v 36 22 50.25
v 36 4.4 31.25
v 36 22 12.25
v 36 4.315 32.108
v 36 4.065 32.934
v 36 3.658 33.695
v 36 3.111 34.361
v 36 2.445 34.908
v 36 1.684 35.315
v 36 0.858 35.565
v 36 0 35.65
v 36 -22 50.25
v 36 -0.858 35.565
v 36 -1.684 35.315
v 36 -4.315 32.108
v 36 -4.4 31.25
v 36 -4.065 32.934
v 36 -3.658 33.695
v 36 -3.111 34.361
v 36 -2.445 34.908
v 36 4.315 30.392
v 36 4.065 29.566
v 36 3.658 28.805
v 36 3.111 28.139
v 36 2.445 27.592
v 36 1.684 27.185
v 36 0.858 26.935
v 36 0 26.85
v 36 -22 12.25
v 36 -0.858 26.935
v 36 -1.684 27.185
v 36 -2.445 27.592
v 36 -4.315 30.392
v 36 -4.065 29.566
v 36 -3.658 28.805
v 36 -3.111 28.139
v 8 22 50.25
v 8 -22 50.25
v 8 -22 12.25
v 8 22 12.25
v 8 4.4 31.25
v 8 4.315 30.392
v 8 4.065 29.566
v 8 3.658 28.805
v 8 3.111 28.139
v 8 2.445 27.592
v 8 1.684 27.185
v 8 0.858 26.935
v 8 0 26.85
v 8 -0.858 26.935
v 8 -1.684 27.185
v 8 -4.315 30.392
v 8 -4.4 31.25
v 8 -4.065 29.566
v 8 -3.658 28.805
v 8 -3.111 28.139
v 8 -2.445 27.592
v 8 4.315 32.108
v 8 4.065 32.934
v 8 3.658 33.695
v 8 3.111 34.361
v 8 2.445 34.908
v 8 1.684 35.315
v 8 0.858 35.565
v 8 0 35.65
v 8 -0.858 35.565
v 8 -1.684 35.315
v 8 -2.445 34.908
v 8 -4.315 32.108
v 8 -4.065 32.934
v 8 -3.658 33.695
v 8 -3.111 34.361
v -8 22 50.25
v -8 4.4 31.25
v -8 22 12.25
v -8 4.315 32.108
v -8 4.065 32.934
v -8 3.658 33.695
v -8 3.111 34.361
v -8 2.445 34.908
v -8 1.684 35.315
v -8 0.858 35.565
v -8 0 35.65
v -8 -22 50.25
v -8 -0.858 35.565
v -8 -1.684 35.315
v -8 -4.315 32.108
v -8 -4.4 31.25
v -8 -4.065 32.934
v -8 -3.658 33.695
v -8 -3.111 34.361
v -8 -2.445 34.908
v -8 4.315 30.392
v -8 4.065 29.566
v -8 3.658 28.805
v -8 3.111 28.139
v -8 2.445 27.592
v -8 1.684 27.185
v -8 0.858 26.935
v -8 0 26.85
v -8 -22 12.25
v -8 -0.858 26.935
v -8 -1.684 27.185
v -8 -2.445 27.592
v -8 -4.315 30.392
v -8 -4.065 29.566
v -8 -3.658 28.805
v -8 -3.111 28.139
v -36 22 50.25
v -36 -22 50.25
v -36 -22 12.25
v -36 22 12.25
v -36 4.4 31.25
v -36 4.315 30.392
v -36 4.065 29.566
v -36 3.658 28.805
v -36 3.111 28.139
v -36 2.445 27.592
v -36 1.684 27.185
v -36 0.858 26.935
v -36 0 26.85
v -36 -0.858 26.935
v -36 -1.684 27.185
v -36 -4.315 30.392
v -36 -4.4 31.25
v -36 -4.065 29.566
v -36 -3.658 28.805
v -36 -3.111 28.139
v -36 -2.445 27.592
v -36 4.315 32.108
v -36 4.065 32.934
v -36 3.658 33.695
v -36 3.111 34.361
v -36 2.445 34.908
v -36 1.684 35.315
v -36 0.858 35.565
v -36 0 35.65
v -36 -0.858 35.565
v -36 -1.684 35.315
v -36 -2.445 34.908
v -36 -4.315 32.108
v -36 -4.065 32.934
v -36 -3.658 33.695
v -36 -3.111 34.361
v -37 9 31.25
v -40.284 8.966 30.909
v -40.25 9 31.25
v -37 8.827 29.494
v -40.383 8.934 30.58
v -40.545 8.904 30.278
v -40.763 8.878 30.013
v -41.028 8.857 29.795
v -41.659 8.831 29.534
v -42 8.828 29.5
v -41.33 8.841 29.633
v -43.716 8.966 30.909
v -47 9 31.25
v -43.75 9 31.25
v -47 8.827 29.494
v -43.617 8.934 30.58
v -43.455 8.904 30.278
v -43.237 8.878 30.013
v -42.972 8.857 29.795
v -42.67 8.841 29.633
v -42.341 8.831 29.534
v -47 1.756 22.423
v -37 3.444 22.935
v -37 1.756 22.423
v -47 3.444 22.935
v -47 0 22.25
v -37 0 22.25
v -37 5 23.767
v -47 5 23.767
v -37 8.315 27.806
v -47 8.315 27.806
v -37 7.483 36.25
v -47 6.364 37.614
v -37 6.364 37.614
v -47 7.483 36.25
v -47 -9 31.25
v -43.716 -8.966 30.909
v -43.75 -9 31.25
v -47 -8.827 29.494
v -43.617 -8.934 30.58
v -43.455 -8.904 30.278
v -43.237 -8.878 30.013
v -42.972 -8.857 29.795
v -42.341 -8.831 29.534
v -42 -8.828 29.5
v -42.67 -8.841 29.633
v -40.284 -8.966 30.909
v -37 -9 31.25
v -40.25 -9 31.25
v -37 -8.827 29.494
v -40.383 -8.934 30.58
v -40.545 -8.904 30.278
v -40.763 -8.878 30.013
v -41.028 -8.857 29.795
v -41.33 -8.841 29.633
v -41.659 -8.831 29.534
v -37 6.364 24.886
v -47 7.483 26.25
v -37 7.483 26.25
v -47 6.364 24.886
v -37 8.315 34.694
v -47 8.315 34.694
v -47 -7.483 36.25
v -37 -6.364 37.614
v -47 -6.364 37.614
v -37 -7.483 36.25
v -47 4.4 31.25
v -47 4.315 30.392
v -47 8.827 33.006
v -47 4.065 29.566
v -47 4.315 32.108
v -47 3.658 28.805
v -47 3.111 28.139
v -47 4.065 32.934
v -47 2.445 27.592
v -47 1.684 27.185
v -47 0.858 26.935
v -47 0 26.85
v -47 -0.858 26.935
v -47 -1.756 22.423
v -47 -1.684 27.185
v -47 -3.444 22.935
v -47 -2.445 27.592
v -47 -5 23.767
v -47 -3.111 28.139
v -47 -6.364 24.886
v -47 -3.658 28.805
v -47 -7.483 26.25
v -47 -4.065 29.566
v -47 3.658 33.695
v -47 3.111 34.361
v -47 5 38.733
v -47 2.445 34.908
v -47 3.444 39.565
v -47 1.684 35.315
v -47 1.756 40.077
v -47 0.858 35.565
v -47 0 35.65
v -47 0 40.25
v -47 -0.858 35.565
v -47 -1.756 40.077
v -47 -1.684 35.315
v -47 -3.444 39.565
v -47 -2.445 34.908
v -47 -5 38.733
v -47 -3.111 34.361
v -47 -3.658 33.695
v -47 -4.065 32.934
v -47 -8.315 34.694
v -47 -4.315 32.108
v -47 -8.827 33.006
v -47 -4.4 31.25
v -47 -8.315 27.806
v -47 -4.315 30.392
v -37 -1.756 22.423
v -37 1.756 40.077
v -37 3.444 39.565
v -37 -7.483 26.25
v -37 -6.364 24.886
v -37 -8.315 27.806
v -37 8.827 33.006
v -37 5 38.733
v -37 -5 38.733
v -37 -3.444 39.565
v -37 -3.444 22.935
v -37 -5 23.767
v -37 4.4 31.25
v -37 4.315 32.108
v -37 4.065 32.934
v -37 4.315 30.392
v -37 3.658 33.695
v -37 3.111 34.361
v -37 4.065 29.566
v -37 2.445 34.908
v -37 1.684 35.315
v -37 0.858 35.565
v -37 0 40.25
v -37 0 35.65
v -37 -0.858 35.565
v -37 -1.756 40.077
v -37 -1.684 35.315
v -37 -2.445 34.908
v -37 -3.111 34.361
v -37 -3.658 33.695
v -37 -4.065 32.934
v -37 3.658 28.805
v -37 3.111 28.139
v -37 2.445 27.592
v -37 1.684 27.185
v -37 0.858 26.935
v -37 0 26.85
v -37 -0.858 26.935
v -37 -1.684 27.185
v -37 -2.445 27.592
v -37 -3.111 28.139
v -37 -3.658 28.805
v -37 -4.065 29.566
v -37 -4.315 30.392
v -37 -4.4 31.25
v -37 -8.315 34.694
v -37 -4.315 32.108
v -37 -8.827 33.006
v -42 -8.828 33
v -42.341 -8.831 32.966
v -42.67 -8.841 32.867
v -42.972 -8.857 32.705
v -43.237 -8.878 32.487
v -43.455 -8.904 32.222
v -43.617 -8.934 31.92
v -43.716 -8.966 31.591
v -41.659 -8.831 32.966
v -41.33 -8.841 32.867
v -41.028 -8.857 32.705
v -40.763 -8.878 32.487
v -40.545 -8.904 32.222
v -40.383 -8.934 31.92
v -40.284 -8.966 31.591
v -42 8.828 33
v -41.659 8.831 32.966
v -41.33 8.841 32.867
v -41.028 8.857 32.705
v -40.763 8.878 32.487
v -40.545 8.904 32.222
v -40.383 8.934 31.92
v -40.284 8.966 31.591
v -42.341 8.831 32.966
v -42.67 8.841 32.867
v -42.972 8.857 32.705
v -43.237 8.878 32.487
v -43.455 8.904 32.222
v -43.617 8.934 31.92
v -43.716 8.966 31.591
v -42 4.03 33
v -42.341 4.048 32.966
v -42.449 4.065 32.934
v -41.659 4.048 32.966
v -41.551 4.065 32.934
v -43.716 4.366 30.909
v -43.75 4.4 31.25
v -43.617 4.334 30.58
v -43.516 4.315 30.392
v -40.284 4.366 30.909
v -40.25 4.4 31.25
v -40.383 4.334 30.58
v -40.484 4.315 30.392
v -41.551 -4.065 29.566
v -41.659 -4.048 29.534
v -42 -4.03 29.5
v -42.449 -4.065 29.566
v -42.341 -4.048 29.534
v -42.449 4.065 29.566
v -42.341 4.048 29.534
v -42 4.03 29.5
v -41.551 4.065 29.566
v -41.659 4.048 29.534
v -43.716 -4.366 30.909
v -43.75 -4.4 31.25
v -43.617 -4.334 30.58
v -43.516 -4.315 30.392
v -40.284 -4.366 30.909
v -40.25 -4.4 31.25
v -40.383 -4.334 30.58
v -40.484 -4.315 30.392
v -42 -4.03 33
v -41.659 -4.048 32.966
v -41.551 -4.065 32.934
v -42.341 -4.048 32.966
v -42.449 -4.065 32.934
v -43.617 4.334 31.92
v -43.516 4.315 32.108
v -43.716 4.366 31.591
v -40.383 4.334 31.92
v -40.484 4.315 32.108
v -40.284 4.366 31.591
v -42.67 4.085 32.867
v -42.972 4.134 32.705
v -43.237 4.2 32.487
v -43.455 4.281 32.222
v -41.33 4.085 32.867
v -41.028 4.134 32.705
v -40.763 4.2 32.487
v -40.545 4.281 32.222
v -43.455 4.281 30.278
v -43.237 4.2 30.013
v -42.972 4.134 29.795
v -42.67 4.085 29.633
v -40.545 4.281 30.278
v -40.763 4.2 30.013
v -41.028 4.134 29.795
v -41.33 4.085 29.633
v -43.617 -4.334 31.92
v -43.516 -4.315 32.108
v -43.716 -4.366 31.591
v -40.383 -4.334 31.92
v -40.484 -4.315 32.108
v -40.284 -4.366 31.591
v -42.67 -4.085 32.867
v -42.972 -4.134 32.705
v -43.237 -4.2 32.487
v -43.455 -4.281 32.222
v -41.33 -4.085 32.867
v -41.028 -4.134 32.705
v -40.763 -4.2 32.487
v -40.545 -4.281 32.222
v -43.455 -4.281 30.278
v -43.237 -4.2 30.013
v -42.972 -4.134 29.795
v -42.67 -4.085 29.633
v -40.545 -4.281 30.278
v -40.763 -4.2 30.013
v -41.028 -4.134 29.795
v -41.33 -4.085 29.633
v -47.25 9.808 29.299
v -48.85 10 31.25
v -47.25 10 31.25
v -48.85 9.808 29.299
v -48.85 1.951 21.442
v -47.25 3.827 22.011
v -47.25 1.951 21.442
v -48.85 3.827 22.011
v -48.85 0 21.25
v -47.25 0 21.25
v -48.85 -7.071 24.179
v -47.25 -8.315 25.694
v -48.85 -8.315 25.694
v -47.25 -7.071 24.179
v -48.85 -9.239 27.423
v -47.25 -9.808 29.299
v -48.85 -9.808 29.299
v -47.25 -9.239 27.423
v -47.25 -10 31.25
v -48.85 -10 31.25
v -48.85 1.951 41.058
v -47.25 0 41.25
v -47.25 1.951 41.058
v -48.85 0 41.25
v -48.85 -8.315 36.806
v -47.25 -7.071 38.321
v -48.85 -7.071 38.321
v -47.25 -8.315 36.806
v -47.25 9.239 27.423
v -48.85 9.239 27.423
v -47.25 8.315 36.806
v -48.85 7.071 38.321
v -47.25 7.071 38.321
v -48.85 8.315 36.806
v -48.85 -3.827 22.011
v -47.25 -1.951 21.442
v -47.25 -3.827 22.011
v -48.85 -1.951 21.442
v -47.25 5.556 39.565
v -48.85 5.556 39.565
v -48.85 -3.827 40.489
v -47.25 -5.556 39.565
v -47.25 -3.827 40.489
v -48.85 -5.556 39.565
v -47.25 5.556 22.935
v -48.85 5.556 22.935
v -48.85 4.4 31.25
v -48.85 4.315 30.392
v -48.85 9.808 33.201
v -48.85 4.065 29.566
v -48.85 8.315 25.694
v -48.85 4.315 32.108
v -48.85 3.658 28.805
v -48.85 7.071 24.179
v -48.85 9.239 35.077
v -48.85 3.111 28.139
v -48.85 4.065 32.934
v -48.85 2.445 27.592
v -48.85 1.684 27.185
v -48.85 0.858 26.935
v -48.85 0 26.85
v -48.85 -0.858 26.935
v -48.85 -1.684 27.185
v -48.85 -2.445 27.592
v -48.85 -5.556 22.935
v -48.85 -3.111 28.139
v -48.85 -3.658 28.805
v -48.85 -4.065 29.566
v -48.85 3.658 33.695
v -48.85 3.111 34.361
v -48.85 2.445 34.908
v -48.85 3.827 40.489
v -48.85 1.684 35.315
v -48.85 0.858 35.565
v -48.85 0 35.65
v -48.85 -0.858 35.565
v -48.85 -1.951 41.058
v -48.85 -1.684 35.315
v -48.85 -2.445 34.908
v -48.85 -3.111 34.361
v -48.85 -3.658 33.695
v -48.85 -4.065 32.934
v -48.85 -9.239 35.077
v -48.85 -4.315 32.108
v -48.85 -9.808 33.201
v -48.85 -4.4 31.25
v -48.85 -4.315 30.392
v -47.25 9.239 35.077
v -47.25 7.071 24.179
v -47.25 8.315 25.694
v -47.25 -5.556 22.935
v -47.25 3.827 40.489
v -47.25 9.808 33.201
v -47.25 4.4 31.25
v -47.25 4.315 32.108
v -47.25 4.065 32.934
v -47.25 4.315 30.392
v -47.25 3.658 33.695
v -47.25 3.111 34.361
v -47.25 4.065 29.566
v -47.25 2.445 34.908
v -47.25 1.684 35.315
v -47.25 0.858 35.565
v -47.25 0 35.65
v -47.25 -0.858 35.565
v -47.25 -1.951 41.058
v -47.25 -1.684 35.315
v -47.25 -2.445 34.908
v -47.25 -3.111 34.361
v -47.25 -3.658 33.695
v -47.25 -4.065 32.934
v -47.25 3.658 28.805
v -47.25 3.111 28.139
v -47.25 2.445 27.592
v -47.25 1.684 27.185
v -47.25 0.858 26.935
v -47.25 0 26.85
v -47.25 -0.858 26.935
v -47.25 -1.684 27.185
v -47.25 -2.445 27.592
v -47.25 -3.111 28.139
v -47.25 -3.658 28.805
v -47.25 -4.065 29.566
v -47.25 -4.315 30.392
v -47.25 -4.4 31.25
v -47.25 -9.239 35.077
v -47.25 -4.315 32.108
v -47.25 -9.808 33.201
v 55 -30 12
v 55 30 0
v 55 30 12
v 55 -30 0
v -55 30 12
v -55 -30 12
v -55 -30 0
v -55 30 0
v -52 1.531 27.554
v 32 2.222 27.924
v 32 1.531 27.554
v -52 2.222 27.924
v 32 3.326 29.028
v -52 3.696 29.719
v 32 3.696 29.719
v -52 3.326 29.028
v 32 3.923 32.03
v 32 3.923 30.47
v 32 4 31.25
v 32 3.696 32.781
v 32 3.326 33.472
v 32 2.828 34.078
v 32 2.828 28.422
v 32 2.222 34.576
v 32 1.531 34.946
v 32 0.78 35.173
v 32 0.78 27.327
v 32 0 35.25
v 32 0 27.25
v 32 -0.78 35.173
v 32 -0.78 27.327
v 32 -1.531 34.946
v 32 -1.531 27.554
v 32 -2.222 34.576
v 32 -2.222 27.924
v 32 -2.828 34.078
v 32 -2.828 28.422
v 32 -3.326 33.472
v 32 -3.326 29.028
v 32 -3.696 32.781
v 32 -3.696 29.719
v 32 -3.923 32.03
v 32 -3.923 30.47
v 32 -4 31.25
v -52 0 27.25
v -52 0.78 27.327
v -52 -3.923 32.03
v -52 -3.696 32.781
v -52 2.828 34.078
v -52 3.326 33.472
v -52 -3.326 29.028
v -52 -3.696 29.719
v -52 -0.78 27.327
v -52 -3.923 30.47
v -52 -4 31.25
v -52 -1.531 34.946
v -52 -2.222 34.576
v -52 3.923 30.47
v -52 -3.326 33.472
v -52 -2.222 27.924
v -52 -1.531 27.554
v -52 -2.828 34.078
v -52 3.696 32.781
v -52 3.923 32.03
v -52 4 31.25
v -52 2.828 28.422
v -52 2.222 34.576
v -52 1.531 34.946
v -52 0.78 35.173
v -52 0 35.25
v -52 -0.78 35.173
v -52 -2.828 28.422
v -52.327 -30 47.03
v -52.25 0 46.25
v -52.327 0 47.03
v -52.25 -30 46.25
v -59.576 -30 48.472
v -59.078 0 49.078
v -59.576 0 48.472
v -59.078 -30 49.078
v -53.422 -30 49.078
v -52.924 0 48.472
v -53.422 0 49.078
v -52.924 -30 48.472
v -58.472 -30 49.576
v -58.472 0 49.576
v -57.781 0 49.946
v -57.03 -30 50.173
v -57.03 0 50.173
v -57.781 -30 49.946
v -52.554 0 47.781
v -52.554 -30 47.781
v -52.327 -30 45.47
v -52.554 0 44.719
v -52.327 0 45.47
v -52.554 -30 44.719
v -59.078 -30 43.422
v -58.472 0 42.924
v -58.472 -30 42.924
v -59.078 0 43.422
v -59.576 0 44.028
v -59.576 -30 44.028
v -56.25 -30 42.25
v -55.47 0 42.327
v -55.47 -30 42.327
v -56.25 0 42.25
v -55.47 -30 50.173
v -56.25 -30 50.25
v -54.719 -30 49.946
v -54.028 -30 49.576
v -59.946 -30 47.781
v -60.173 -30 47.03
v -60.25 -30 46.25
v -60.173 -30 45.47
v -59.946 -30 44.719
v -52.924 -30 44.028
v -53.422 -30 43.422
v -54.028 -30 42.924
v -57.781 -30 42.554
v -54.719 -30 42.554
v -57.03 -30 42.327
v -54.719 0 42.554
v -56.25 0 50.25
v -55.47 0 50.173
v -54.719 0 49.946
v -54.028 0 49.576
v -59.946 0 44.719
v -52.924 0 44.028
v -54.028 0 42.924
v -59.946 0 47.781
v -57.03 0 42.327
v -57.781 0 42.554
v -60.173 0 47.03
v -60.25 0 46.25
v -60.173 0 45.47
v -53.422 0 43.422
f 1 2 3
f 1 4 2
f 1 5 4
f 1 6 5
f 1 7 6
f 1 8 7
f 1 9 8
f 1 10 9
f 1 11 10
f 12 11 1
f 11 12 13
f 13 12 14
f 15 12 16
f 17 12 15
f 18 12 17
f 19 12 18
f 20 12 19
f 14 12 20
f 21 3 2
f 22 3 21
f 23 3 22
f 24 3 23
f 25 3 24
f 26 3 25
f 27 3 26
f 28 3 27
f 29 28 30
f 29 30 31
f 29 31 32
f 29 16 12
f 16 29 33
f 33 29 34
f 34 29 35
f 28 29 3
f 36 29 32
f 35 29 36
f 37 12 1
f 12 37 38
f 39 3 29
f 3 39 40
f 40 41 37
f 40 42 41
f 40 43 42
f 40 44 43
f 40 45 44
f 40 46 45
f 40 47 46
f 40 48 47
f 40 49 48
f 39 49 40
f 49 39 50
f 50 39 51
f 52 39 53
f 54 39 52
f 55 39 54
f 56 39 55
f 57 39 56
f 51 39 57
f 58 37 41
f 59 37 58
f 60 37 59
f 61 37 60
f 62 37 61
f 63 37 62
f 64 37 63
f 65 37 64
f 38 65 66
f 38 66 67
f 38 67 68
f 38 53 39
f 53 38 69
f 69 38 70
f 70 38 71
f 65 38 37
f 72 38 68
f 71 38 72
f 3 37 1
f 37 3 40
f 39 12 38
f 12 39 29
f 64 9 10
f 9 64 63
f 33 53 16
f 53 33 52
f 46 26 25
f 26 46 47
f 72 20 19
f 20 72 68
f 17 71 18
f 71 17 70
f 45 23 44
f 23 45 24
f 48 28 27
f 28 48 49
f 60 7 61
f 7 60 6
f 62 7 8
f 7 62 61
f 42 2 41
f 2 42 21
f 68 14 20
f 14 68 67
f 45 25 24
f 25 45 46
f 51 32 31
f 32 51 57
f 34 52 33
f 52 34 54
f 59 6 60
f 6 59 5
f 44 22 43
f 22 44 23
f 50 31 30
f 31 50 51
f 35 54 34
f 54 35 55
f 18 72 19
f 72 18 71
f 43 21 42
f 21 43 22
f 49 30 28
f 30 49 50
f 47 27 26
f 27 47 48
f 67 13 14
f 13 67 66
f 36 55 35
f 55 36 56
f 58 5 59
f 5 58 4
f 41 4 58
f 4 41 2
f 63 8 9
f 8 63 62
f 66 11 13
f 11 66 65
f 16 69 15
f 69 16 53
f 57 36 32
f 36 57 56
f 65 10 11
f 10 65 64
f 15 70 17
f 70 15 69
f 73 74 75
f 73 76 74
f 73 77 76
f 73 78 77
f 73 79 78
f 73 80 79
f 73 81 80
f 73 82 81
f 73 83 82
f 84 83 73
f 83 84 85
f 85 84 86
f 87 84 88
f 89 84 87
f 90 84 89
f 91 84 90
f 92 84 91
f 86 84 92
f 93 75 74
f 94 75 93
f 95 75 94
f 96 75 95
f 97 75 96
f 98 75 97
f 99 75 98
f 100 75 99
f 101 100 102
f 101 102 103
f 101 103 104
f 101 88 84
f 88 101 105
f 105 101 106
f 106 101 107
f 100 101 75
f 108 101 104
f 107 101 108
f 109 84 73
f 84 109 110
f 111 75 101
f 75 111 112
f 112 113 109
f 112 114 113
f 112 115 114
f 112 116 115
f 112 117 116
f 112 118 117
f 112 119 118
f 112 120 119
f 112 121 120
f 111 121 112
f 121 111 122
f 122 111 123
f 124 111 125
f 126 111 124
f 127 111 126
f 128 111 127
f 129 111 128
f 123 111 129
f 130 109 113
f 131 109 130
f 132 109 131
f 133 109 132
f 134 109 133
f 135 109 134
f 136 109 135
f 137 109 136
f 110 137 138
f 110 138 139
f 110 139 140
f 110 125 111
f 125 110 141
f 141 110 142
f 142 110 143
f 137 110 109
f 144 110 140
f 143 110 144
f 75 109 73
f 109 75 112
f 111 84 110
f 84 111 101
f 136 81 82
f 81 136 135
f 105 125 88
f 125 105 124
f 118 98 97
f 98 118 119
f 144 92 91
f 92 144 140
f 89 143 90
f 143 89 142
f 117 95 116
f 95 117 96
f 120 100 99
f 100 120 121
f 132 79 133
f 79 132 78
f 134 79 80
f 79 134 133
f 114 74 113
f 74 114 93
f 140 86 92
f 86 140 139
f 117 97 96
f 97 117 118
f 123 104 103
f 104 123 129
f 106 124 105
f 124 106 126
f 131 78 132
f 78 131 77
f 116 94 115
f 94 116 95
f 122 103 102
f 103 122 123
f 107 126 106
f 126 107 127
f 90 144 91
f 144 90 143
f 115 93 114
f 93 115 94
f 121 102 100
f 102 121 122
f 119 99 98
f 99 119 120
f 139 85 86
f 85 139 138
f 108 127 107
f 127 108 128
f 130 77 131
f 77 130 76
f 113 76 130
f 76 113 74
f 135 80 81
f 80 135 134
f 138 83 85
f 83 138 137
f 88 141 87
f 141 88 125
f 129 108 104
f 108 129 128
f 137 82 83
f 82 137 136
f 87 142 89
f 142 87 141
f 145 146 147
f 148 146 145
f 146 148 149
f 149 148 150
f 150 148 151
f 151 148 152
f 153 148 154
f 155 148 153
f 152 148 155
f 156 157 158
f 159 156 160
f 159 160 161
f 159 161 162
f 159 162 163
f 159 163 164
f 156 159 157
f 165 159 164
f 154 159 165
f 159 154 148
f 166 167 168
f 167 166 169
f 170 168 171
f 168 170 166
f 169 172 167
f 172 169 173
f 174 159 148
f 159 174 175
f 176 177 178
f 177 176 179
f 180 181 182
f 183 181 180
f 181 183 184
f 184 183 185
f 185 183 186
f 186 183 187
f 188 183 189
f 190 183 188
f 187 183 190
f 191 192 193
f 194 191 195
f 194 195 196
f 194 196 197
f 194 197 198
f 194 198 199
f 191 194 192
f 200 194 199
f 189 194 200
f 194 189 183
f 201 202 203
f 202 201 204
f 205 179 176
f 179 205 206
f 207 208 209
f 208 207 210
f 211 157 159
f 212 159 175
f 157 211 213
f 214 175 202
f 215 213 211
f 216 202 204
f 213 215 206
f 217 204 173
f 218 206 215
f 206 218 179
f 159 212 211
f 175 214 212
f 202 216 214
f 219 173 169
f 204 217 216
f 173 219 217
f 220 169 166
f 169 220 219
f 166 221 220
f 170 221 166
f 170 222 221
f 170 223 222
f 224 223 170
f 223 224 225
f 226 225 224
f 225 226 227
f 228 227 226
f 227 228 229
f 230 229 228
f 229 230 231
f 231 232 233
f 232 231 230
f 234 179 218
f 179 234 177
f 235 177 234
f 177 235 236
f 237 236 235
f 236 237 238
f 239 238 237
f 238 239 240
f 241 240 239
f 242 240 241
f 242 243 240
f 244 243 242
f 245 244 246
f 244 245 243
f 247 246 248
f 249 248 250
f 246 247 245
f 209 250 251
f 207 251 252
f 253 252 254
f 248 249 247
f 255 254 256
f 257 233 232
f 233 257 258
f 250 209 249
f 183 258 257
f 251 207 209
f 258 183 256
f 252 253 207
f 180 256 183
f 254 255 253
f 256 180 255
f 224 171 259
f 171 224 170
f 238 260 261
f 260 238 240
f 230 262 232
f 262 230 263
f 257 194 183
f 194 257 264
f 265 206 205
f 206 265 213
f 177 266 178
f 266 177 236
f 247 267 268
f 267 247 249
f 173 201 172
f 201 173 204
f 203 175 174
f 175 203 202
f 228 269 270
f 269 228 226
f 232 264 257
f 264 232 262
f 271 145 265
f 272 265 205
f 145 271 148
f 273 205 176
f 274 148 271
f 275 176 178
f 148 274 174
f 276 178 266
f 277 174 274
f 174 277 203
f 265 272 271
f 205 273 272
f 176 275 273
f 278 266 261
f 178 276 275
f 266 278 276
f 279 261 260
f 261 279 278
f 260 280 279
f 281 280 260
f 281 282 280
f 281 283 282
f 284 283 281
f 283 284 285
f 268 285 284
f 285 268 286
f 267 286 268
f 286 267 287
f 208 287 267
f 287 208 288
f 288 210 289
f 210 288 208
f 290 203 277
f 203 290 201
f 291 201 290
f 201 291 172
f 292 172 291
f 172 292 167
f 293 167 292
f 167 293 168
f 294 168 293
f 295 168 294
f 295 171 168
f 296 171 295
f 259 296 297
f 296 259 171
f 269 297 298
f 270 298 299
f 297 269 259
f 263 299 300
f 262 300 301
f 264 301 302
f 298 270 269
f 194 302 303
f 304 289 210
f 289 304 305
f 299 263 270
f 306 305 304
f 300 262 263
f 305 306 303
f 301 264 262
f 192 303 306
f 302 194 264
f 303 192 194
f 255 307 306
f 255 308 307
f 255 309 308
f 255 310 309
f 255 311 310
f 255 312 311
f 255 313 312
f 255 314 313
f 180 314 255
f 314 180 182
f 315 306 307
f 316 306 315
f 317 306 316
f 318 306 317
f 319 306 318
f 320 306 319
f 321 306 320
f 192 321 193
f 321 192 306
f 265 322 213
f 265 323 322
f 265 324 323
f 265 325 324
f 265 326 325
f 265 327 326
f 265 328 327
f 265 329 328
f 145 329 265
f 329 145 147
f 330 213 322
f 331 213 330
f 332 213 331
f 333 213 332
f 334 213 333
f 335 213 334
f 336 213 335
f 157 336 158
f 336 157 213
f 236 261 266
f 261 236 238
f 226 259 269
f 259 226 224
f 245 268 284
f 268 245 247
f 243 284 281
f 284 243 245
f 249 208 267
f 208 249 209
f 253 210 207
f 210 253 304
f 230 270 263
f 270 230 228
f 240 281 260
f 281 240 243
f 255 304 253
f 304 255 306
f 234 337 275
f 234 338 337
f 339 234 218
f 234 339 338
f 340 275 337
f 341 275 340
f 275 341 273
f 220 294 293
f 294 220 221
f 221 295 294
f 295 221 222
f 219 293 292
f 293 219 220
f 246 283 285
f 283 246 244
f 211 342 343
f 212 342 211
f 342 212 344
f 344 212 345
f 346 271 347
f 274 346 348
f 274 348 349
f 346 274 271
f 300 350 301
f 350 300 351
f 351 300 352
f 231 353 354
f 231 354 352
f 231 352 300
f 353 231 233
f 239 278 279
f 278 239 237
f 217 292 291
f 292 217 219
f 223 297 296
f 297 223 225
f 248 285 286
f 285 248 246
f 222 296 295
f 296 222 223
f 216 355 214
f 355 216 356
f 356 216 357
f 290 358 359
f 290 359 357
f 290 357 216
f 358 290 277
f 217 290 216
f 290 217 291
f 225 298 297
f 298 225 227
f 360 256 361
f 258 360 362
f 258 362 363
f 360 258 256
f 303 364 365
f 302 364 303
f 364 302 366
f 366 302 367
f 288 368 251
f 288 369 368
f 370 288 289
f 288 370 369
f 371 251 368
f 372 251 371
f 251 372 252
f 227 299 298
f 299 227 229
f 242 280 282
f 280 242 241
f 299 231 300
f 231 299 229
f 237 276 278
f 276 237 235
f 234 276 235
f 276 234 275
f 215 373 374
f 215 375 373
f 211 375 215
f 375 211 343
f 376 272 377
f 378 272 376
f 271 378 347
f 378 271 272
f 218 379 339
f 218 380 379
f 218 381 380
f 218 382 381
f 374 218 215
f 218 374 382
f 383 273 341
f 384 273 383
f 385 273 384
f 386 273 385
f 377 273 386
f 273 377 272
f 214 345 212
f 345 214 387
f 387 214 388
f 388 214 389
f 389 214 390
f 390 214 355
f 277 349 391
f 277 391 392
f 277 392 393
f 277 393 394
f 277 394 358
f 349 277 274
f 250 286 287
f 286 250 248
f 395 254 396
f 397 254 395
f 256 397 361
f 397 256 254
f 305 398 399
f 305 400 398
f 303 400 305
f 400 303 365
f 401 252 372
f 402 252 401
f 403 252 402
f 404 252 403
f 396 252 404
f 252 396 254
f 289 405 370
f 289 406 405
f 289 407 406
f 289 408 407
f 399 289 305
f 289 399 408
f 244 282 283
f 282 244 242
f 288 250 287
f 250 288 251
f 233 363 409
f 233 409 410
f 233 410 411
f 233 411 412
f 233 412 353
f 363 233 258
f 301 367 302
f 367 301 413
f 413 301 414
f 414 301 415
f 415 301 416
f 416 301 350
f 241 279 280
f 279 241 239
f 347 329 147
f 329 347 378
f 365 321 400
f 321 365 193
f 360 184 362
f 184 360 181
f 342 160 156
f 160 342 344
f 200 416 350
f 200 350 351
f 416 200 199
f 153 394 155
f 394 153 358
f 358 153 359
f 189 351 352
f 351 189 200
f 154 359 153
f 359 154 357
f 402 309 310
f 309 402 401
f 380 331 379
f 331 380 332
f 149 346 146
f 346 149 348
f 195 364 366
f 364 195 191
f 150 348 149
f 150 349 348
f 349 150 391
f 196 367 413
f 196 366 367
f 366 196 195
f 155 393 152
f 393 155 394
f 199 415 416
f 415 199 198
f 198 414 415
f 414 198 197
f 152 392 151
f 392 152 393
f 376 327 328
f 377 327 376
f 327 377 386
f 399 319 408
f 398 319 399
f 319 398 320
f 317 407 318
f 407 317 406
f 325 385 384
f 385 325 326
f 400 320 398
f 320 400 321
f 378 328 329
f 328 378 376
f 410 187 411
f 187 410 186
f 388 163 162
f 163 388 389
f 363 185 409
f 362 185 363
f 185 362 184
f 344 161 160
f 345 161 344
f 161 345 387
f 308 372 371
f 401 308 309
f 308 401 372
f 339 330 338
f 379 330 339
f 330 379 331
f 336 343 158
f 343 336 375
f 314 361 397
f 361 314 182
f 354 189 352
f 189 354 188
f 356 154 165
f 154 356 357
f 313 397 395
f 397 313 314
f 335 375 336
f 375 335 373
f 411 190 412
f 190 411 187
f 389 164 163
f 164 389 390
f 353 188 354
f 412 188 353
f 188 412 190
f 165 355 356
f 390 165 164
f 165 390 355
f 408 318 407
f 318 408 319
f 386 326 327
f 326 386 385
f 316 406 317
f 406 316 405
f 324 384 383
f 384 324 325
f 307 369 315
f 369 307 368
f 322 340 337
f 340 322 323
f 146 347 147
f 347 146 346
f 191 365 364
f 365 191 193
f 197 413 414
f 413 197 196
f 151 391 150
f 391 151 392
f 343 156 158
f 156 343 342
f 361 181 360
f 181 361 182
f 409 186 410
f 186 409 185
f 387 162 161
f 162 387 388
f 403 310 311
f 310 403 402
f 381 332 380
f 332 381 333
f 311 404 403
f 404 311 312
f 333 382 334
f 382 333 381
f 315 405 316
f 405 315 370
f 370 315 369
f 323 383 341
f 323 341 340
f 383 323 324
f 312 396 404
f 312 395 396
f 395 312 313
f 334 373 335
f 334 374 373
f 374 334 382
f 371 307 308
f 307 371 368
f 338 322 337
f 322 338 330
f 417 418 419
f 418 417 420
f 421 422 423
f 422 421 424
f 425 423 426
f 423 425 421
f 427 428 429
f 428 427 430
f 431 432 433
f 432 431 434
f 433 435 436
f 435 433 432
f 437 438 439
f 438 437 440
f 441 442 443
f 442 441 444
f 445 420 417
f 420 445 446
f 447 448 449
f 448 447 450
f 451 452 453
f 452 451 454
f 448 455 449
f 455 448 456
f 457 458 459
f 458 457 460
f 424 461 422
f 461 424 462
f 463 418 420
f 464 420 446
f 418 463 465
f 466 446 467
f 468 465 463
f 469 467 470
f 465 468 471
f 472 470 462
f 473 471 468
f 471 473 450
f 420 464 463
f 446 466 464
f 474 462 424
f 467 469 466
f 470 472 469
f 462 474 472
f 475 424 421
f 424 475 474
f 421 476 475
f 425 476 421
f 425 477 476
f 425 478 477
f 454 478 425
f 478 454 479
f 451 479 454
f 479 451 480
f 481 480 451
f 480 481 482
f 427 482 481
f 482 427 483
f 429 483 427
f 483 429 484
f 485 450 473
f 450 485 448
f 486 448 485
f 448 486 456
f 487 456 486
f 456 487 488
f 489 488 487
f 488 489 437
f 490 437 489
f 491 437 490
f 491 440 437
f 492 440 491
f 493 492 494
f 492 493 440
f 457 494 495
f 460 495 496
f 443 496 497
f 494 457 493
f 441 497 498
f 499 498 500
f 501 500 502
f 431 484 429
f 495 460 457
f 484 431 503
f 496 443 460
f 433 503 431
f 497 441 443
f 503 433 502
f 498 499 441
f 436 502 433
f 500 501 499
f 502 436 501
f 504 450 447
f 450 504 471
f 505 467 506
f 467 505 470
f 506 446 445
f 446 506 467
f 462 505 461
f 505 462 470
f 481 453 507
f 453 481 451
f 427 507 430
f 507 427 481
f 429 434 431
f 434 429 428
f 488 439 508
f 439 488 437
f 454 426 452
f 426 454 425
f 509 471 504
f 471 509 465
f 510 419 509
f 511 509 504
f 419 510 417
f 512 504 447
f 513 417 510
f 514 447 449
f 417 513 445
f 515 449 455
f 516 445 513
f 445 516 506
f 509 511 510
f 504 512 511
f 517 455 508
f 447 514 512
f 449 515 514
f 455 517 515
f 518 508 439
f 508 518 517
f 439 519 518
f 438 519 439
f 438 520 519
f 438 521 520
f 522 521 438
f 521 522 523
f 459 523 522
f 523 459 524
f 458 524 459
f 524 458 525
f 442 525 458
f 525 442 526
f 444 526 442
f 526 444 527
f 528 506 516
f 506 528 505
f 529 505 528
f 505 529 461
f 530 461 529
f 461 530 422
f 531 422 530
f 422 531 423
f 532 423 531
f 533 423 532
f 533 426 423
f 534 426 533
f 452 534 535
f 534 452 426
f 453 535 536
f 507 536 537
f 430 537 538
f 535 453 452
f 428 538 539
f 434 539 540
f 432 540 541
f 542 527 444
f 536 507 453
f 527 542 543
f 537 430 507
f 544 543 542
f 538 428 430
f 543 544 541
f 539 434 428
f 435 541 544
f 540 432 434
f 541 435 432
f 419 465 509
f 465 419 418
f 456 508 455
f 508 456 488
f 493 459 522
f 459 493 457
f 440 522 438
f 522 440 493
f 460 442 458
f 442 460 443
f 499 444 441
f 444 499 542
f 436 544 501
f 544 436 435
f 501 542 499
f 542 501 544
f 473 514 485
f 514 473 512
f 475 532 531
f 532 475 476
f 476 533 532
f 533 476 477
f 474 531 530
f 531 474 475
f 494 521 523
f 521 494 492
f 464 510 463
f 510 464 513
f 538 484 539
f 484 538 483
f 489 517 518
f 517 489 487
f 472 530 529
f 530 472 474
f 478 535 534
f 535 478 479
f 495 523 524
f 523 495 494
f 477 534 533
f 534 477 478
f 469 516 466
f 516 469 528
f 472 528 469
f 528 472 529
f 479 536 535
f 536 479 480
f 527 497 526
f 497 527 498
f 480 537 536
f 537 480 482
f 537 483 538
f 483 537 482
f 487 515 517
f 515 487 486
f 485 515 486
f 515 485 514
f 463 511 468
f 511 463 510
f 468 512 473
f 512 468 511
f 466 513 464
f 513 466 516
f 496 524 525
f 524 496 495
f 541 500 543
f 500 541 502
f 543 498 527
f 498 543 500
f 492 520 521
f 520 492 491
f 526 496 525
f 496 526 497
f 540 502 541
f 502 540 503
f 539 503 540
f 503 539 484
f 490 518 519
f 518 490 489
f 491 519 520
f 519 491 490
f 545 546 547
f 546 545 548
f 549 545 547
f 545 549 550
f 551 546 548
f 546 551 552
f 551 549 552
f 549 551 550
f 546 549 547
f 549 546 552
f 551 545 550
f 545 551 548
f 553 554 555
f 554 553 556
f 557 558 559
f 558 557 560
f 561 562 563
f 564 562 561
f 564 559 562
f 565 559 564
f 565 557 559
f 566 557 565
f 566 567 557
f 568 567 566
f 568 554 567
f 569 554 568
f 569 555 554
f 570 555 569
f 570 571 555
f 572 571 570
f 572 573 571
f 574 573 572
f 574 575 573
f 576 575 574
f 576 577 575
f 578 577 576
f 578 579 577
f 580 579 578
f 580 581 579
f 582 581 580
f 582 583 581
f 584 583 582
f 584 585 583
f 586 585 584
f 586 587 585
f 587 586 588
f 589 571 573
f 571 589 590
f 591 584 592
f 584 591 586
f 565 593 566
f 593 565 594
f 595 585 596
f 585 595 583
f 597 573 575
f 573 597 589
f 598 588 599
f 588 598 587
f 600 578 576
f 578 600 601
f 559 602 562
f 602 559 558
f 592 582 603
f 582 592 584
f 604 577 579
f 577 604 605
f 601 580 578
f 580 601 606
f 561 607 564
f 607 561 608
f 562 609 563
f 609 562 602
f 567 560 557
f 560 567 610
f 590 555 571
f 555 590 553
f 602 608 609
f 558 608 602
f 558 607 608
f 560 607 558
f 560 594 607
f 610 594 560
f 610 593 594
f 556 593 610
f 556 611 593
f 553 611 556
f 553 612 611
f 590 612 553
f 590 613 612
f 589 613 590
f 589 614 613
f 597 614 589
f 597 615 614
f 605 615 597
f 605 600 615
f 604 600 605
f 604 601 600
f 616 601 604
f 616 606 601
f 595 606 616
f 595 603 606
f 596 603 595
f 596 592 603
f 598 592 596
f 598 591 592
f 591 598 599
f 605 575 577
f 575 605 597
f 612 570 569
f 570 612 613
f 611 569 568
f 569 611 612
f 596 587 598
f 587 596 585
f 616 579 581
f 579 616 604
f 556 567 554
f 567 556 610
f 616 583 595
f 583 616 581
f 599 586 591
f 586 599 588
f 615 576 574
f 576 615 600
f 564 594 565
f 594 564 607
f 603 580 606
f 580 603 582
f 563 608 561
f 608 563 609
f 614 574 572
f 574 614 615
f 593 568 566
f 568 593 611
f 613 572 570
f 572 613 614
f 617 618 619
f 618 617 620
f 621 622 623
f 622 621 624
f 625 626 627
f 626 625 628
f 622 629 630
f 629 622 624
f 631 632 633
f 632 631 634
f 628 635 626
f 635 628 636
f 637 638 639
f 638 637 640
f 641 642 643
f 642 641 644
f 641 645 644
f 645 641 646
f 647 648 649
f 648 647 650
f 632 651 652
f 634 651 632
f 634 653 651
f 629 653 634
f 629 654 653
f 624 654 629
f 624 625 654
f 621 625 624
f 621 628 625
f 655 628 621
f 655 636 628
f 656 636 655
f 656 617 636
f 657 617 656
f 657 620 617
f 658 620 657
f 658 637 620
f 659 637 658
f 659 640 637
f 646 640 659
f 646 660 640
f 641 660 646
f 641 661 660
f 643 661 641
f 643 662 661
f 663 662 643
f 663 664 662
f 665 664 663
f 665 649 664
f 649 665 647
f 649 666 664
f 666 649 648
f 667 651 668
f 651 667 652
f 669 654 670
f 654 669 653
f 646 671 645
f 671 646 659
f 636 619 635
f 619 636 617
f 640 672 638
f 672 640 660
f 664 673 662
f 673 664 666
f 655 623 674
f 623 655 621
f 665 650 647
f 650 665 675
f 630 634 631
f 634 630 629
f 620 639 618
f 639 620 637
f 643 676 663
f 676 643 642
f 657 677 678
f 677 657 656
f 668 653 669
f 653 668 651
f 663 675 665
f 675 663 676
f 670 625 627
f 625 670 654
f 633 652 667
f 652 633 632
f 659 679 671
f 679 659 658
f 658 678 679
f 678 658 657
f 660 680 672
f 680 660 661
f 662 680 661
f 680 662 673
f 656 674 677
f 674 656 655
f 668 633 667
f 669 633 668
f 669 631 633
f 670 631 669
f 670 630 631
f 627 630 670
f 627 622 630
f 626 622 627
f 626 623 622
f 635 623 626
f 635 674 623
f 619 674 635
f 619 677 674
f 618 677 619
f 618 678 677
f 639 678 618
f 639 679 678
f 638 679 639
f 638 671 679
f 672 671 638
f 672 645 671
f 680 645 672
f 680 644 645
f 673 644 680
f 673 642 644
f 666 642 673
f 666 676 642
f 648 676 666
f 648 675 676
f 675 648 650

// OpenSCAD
$fn = 32;

// ------------------------------------------------------------------------
// Machine vise: screw d8, jaws 28 x 38 mm
// Every part is its own module, assembly() places every instance.
// ------------------------------------------------------------------------

// --- part 1 ---
module vise_bed() {
  difference() {
    translate([-55, -30, 0]) cube([110, 60, 12]);
  }
}

// --- part 2 ---
module vise_jaw() {
  difference() {
    translate([-14, -22, 0]) cube([28, 44, 38]);
    translate([0, 0, 19]) rotate([0, 90, 0]) cylinder(h = 30, d = 8.8, center = true);
  }
}

// --- part 3 ---
module vise_screw() {
  translate([0, 0, -42]) cylinder(h = 84, d = 8);
}

// --- part 4 ---
module screw_collar() {
  difference() {
    cylinder(h = 10, d = 18);
    translate([0, 0, -1]) cylinder(h = 12, d = 8.8);
    translate([0, 0, 5]) rotate([90, 0, 0]) cylinder(h = 20, d = 3.5, center = true);
  }
}

// --- part 5 ---
module screw_washer() {
  difference() {
      translate([0, 0, 0]) cylinder(h = 1.6, d = 20);
      translate([0, 0, -1]) cylinder(h = 3.6, d = 8.8);
    }
}

// --- part 6 ---
module vise_handle() {
  cylinder(h = 30, d = 8);
}

// --- assembly ---
module assembly() {
  color([0.80, 0.24, 0.20]) translate([0, 0, 0]) rotate([0, 0, 0]) vise_bed();
  color([0.20, 0.45, 0.75]) translate([22, 0, 12.25]) rotate([0, 0, 0]) vise_jaw();
  color([0.25, 0.62, 0.32]) translate([-22, 0, 12.25]) rotate([0, 0, 0]) vise_jaw();
  color([0.92, 0.70, 0.18]) translate([-10, 0, 31.25]) rotate([0, 90, 0]) vise_screw();
  color([0.58, 0.35, 0.70]) translate([-47, 0, 31.25]) rotate([0, 90, 0]) screw_collar();
  color([0.16, 0.66, 0.66]) translate([-48.85, 0, 31.25]) rotate([0, 90, 0]) screw_washer();
  color([0.85, 0.48, 0.18]) translate([-56.25, 0, 46.25]) rotate([90, 0, 0]) vise_handle();
}

assembly();
